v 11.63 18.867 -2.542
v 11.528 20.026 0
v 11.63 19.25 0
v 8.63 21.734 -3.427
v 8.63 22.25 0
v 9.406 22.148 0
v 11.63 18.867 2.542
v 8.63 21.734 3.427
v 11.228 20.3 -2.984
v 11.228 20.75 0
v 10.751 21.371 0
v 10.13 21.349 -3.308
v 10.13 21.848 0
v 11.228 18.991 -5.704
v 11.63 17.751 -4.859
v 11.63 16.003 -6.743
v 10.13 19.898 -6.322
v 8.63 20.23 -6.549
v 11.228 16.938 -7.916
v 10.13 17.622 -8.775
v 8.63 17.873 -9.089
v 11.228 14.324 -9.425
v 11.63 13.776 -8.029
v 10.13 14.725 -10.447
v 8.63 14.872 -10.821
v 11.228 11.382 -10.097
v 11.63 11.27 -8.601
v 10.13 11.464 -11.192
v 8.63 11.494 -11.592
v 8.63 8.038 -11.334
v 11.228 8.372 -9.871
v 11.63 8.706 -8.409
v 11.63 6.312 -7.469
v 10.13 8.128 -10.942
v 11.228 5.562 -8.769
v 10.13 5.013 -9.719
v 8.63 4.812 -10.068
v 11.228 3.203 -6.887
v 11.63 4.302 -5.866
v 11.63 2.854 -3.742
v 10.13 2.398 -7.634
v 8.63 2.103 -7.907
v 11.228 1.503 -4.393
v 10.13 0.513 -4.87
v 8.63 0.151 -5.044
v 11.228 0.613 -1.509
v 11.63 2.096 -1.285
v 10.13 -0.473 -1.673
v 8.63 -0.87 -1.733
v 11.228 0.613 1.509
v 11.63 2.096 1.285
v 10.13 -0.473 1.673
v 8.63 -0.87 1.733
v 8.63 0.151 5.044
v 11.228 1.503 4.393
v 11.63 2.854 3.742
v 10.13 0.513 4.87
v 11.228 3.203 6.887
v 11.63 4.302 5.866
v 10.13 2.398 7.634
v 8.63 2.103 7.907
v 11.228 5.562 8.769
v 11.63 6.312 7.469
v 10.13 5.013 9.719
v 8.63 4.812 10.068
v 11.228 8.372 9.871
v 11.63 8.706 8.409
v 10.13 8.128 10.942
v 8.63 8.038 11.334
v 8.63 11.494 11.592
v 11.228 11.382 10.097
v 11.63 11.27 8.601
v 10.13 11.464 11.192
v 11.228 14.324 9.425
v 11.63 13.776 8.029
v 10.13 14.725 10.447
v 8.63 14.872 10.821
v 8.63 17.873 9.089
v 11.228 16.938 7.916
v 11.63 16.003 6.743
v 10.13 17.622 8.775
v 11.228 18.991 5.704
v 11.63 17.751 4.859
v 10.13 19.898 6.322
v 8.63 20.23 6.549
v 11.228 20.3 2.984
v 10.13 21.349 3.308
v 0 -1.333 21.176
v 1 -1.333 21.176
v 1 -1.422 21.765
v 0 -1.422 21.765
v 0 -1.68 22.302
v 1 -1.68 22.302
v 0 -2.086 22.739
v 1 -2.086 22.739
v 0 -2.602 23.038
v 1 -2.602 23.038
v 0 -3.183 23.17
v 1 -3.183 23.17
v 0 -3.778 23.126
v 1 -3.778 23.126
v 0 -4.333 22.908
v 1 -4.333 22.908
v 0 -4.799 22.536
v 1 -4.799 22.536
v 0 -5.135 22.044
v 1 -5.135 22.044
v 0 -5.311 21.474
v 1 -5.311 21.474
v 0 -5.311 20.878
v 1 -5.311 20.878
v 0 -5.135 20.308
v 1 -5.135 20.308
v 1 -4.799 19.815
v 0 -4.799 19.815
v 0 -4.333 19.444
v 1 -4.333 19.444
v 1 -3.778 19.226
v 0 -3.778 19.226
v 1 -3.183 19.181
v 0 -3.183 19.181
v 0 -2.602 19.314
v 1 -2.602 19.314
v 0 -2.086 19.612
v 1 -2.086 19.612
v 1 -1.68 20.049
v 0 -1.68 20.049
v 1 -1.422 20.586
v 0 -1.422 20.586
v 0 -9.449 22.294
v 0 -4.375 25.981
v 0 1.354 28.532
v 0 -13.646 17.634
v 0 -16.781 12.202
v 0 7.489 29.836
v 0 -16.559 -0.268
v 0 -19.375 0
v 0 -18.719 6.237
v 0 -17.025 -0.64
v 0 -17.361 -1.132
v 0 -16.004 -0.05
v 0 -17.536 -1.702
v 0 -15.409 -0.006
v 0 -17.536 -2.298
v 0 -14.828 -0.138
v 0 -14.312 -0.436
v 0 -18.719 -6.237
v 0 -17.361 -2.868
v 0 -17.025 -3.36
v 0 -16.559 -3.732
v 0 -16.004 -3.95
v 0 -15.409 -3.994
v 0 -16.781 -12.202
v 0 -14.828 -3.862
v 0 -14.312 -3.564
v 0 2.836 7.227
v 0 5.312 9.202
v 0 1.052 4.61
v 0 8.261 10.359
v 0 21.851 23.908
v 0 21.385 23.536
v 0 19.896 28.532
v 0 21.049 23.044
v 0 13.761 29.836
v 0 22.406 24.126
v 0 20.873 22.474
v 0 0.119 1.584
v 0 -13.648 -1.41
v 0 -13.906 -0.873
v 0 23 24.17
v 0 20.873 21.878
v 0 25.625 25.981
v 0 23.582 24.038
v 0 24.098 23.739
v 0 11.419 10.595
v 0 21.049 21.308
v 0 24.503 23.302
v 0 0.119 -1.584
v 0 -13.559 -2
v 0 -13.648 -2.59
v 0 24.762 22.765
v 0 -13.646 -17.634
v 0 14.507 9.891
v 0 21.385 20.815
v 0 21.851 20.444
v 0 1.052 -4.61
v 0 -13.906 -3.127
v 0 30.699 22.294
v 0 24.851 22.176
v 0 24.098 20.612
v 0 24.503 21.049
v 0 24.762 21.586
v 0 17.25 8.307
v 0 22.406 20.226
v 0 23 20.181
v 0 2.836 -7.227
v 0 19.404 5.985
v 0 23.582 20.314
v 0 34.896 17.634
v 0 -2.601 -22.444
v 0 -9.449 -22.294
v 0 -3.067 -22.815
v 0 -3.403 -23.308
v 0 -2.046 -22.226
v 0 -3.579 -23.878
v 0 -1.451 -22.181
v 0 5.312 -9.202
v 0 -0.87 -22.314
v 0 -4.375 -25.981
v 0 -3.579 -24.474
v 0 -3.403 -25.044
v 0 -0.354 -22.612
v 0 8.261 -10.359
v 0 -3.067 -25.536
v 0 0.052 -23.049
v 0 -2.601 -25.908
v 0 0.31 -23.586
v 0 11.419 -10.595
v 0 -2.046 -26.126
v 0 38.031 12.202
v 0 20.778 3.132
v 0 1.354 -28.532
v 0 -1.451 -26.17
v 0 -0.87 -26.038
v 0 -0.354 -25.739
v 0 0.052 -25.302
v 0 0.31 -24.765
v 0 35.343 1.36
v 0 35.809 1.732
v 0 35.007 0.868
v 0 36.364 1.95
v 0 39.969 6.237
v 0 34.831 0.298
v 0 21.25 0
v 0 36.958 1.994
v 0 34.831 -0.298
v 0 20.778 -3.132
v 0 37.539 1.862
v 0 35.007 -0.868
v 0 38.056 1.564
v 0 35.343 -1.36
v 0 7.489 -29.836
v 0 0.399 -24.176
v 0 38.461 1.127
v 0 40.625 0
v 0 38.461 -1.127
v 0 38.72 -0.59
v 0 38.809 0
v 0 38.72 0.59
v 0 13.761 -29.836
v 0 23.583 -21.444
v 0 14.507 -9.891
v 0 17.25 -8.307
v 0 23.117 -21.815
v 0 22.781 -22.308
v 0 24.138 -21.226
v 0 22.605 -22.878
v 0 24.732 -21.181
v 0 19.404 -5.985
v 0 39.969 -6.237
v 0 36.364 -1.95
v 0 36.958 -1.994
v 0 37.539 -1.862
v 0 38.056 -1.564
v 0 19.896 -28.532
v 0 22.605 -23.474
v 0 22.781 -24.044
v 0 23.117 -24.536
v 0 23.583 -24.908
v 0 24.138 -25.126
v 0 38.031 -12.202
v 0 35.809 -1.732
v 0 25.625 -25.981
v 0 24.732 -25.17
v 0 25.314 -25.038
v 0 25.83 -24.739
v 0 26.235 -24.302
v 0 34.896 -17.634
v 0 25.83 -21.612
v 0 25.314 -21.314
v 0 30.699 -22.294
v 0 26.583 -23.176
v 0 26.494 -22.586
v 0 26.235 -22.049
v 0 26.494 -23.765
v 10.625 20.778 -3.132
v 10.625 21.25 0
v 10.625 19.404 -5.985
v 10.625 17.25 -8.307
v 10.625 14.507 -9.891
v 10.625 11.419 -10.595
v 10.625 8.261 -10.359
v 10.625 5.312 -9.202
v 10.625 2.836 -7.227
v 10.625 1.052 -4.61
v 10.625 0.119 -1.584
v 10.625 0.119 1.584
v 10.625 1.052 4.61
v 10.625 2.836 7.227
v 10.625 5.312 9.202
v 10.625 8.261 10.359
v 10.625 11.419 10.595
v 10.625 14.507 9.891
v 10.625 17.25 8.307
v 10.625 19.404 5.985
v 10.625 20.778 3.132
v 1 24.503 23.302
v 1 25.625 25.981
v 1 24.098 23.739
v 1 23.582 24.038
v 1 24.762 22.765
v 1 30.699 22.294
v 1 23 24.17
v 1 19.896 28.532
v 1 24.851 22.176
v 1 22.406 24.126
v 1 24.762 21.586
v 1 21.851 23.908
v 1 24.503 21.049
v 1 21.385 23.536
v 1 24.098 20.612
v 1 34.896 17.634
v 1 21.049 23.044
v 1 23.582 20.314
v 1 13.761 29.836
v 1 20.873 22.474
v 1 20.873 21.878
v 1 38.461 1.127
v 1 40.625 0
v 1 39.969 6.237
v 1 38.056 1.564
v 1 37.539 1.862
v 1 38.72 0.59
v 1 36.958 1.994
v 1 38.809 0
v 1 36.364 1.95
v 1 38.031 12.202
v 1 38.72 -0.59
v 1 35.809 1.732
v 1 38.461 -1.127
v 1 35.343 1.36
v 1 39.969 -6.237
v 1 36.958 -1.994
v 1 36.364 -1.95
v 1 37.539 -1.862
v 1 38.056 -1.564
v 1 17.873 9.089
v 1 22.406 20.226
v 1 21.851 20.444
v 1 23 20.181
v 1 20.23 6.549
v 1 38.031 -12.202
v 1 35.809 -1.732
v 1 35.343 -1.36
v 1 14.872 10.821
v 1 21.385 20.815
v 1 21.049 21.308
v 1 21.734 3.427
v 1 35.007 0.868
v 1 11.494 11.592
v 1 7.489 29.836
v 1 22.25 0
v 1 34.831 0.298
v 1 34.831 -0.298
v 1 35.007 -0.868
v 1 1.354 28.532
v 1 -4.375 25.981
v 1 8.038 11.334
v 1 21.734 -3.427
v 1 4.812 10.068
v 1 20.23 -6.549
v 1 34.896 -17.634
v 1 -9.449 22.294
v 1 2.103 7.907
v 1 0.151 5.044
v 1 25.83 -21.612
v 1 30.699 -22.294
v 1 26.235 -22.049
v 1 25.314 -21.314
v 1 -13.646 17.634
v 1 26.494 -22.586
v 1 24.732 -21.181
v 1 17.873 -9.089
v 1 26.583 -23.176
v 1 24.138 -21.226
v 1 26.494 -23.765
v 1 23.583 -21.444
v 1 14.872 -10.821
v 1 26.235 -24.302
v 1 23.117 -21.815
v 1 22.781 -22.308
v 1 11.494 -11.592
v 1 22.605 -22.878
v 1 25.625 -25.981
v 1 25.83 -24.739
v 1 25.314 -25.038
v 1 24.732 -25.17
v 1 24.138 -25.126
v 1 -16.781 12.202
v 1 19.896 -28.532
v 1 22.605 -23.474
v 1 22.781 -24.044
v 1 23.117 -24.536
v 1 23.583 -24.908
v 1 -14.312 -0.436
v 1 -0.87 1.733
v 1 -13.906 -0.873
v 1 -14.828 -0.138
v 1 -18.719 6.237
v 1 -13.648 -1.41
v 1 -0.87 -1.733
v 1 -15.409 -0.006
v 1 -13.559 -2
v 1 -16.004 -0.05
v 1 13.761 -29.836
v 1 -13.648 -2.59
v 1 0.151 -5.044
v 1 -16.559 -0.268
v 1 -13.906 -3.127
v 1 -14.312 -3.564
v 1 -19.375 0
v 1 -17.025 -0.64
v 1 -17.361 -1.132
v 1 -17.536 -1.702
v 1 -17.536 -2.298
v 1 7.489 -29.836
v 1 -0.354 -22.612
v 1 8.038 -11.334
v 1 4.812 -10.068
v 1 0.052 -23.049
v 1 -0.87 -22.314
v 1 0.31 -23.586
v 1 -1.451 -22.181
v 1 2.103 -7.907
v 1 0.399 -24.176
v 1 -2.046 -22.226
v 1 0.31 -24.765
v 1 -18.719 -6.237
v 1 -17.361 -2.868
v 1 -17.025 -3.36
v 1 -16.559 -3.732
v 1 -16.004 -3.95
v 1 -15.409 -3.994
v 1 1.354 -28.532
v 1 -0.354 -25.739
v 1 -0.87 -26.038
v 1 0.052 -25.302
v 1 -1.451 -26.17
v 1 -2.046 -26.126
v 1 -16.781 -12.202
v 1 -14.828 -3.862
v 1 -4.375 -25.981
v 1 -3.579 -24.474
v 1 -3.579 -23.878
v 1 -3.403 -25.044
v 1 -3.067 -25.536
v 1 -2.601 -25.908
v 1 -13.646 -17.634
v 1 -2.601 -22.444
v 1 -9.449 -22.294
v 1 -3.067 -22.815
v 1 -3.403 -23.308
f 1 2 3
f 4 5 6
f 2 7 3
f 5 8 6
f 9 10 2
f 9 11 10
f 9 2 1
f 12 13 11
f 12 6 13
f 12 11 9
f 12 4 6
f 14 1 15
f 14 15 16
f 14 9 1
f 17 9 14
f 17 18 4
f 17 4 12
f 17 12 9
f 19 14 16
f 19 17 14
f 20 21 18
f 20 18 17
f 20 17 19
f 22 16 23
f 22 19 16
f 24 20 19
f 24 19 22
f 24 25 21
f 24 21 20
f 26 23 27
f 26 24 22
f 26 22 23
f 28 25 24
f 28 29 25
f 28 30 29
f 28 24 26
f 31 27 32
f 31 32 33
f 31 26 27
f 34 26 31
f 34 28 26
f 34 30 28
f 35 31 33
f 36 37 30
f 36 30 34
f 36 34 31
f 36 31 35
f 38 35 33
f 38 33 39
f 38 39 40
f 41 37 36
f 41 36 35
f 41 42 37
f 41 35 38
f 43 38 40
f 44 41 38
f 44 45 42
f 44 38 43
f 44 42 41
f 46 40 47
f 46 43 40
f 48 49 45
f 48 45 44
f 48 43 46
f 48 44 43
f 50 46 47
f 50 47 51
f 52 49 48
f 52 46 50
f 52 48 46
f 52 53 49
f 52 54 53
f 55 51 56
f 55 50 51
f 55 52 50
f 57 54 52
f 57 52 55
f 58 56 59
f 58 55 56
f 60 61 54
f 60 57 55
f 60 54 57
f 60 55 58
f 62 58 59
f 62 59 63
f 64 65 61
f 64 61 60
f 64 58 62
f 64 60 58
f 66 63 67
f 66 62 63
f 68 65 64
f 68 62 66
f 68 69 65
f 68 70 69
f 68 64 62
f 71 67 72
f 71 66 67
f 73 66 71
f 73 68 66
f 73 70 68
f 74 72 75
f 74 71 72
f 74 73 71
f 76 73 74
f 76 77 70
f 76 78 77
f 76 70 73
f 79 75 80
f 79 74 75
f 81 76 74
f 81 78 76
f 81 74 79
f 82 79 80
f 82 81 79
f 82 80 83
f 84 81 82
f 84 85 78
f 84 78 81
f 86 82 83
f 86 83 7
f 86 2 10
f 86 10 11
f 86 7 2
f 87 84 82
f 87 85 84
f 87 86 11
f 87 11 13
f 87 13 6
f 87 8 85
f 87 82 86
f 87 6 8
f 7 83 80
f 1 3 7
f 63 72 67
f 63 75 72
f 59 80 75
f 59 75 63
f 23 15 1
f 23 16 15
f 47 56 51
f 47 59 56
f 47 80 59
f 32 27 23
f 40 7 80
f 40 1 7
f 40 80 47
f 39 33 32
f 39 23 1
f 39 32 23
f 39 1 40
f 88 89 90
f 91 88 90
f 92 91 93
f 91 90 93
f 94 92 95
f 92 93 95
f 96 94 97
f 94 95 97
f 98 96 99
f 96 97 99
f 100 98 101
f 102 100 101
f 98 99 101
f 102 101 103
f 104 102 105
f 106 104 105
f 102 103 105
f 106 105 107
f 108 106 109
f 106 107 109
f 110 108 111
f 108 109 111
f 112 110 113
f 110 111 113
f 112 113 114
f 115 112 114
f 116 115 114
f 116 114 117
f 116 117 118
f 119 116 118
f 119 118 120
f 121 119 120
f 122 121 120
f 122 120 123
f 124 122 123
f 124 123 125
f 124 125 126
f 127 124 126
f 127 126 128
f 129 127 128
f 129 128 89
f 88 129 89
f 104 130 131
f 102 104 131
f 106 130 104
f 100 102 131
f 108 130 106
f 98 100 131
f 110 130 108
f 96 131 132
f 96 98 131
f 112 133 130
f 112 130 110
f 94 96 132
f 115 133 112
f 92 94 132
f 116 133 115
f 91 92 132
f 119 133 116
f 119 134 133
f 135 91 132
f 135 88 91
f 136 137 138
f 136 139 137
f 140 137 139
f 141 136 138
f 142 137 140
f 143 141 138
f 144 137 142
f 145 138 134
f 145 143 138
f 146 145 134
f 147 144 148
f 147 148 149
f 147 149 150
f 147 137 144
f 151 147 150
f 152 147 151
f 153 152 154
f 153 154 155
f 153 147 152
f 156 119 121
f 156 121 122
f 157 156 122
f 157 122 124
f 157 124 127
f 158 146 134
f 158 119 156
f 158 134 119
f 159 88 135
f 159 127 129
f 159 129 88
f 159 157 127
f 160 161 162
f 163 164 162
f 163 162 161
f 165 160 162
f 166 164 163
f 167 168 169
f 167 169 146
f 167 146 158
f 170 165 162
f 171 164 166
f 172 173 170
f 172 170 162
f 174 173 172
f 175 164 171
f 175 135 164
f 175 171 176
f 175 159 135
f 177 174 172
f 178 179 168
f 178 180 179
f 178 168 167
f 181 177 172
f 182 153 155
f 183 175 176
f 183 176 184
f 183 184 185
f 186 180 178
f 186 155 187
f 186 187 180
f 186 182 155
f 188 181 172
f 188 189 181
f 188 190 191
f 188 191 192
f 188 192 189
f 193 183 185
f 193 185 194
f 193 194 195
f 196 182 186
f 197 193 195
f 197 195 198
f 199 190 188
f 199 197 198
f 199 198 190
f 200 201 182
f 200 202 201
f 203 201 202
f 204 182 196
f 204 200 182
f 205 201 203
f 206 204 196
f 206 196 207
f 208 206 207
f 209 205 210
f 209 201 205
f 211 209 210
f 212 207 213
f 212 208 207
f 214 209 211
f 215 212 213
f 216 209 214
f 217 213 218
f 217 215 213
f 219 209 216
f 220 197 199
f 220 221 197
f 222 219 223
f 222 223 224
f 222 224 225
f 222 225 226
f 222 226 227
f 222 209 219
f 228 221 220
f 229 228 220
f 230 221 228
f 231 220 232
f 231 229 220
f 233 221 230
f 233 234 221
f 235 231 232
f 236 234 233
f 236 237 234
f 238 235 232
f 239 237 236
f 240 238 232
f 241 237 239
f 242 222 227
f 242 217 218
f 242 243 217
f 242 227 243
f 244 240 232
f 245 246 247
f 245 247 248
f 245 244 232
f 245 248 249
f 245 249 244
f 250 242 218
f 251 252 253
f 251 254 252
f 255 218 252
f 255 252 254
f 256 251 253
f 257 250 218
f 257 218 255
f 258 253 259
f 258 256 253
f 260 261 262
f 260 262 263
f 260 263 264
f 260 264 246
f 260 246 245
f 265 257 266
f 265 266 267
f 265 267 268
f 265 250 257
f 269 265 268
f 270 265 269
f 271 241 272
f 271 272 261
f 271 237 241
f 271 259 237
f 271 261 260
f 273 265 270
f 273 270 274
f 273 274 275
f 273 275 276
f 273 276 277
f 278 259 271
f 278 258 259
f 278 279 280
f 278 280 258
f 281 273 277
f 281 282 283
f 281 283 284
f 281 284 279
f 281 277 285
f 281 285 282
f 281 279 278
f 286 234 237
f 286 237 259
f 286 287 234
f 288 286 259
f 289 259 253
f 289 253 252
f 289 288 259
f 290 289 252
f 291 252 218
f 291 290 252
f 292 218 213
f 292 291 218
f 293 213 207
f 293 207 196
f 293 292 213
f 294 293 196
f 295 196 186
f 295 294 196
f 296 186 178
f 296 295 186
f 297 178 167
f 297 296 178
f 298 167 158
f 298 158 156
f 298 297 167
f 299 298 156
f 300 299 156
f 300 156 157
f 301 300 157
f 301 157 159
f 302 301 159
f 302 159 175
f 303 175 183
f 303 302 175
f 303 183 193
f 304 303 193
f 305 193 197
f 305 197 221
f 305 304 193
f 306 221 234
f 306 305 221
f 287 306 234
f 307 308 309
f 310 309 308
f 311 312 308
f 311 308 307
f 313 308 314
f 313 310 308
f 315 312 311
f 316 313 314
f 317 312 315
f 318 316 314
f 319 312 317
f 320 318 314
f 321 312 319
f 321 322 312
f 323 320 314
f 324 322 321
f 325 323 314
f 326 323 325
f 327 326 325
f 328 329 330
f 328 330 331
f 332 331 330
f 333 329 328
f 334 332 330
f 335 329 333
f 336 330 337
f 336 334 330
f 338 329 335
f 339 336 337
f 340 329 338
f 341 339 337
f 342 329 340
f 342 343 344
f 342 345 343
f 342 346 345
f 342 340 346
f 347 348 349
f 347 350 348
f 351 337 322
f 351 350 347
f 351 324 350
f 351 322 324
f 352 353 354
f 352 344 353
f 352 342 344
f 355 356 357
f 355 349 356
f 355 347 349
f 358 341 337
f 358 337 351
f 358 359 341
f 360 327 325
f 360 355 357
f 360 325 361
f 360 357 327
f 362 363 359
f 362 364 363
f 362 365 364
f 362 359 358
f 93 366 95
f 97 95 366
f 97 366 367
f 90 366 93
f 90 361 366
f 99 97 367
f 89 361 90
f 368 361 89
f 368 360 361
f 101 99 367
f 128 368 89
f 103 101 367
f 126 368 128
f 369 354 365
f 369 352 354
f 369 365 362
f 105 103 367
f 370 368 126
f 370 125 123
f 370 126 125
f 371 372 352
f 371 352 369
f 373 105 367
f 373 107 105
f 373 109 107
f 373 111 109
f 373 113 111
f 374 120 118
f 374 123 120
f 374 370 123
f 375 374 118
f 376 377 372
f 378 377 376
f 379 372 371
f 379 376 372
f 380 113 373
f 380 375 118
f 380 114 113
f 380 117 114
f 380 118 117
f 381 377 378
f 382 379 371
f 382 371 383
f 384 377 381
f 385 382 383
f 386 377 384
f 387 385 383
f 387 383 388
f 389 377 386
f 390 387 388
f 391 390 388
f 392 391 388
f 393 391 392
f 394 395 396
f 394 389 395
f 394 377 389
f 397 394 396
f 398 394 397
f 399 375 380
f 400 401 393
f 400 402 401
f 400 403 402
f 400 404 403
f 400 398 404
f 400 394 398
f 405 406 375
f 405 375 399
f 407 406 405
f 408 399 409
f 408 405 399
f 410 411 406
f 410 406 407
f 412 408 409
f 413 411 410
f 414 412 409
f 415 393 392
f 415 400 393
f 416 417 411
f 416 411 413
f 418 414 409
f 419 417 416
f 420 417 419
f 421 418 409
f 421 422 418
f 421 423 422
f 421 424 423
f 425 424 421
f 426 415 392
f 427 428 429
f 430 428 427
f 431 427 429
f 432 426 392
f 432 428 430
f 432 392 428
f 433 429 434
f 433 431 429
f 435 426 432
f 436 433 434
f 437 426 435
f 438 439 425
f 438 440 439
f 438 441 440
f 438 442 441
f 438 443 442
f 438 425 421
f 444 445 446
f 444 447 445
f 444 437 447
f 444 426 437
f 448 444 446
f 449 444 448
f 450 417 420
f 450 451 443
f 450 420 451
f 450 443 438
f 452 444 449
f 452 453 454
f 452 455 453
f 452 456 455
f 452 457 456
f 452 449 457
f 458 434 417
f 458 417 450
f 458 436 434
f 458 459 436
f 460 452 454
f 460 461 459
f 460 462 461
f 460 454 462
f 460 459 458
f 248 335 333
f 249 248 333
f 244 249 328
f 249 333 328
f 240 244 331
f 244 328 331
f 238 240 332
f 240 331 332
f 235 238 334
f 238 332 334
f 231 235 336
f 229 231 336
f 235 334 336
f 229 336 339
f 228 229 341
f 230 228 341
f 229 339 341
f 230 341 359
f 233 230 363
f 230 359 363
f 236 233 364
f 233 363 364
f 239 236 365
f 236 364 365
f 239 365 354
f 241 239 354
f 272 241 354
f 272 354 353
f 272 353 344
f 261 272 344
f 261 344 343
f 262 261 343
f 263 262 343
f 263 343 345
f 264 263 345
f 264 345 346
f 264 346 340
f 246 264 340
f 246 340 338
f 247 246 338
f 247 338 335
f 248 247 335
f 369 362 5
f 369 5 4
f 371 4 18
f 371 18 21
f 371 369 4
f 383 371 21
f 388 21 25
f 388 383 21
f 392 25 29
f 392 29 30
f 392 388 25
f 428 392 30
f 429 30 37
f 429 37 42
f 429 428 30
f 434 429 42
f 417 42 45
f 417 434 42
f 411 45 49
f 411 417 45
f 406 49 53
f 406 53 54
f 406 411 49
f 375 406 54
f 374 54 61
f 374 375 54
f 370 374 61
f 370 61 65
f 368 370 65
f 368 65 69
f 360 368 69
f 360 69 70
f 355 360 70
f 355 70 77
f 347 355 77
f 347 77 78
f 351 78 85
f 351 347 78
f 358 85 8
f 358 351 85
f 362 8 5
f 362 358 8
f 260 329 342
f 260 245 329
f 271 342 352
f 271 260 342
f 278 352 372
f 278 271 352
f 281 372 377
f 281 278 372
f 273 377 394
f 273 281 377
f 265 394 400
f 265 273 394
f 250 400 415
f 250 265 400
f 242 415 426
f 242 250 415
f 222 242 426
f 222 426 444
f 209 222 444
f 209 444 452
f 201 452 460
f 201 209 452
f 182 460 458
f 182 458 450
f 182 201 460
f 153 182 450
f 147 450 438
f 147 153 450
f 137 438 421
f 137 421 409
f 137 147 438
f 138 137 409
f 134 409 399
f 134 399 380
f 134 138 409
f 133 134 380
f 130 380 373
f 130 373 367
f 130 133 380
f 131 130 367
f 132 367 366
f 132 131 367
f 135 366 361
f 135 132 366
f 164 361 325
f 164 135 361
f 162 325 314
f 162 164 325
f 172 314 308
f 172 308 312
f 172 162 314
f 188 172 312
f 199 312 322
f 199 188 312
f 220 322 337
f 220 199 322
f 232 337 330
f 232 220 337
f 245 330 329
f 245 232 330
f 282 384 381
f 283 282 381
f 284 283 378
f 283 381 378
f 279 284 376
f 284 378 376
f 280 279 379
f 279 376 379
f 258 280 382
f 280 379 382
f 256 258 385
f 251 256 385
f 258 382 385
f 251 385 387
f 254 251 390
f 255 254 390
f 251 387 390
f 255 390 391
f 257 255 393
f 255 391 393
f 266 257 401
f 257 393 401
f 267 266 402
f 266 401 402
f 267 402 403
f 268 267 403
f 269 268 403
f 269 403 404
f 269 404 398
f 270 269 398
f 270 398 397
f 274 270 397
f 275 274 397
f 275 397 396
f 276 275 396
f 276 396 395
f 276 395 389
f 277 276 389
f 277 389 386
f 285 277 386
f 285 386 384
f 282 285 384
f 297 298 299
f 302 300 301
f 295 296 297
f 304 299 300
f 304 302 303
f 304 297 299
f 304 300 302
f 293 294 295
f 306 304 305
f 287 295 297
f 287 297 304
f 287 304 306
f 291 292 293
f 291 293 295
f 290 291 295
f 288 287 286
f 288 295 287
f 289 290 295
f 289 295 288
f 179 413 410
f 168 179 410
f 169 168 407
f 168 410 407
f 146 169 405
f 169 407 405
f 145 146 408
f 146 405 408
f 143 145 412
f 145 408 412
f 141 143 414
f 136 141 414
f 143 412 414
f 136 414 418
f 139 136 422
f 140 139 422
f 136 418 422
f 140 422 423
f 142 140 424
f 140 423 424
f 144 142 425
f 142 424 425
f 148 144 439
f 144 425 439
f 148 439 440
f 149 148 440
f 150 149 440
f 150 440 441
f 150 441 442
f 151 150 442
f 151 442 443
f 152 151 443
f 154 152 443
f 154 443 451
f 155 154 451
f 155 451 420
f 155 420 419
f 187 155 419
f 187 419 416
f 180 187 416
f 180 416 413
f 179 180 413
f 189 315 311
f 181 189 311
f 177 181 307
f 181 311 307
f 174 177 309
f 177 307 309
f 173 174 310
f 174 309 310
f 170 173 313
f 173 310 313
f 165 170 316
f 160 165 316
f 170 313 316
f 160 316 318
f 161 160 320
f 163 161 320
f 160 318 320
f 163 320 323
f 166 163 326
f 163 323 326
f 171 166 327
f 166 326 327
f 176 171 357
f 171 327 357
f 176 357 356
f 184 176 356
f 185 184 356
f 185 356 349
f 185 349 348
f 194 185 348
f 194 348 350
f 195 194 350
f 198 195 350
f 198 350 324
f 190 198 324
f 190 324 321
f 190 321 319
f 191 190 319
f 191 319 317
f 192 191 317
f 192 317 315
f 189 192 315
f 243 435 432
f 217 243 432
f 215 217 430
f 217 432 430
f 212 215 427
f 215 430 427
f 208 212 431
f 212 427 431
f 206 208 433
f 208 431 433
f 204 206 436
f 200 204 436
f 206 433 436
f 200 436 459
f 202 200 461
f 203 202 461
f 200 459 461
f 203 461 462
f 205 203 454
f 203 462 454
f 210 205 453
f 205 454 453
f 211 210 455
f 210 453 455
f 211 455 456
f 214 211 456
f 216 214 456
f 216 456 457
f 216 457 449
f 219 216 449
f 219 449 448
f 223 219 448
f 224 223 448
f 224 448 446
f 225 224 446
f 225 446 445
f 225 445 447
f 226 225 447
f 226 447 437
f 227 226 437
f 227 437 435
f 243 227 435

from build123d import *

# Parameters (mm, degrees)
FILLET1_R          = 3
SKETCH2_R          = 2
CUT_EXTRUDE1_DEPTH = 2


with BuildPart() as part:
    # Sketch1 → Revolve1 (revolve)
    with BuildSketch(Plane.XY):
        Polygon((0, 40.625), (0, 21.25), (10.625, 21.25), (10.625, 10.625), (11.63, 10.625), (11.63, 22.25), (1, 22.25), (1, 29.25), (1, 35.625), (1, 40.625), align=None)
    revolve(axis=Axis((11.63, 10.625, 0), (-1, 0, 0)))

    # Fillet1
    fillet1_edges = [part.edges().sort_by_distance(p)[0] for p in [
        (11.63, -1, 0),
    ]]
    fillet(fillet1_edges, radius=FILLET1_R)

    # Sketch2 → Cut-Extrude1 (cut)
    with BuildSketch(Plane(origin=(1, 0, 0), x_dir=(0, 0, -1), z_dir=(1, 0, 0))):
        with Locations(Location((0, 36.80872946, 0), (0, 0, 90))):
            Circle(SKETCH2_R)
        with Locations(Location((23.175774878, 24.582890134, 0), (0, 0, 90))):
            Circle(SKETCH2_R)
        with Locations(Location((24.175774878, -1.600839326, 0), (0, 0, 90))):
            Circle(SKETCH2_R)
        with Locations(Location((2, -15.55872946, 0), (0, 0, 90))):
            Circle(SKETCH2_R)
        with Locations(Location((-21.175774878, -3.332890134, 0), (0, 0, 90))):
            Circle(SKETCH2_R)
        with Locations(Location((-22.175774878, 22.850839326, 0), (0, 0, 90))):
            Circle(SKETCH2_R)
    extrude(amount=-CUT_EXTRUDE1_DEPTH, mode=Mode.SUBTRACT)


solid = part.part
